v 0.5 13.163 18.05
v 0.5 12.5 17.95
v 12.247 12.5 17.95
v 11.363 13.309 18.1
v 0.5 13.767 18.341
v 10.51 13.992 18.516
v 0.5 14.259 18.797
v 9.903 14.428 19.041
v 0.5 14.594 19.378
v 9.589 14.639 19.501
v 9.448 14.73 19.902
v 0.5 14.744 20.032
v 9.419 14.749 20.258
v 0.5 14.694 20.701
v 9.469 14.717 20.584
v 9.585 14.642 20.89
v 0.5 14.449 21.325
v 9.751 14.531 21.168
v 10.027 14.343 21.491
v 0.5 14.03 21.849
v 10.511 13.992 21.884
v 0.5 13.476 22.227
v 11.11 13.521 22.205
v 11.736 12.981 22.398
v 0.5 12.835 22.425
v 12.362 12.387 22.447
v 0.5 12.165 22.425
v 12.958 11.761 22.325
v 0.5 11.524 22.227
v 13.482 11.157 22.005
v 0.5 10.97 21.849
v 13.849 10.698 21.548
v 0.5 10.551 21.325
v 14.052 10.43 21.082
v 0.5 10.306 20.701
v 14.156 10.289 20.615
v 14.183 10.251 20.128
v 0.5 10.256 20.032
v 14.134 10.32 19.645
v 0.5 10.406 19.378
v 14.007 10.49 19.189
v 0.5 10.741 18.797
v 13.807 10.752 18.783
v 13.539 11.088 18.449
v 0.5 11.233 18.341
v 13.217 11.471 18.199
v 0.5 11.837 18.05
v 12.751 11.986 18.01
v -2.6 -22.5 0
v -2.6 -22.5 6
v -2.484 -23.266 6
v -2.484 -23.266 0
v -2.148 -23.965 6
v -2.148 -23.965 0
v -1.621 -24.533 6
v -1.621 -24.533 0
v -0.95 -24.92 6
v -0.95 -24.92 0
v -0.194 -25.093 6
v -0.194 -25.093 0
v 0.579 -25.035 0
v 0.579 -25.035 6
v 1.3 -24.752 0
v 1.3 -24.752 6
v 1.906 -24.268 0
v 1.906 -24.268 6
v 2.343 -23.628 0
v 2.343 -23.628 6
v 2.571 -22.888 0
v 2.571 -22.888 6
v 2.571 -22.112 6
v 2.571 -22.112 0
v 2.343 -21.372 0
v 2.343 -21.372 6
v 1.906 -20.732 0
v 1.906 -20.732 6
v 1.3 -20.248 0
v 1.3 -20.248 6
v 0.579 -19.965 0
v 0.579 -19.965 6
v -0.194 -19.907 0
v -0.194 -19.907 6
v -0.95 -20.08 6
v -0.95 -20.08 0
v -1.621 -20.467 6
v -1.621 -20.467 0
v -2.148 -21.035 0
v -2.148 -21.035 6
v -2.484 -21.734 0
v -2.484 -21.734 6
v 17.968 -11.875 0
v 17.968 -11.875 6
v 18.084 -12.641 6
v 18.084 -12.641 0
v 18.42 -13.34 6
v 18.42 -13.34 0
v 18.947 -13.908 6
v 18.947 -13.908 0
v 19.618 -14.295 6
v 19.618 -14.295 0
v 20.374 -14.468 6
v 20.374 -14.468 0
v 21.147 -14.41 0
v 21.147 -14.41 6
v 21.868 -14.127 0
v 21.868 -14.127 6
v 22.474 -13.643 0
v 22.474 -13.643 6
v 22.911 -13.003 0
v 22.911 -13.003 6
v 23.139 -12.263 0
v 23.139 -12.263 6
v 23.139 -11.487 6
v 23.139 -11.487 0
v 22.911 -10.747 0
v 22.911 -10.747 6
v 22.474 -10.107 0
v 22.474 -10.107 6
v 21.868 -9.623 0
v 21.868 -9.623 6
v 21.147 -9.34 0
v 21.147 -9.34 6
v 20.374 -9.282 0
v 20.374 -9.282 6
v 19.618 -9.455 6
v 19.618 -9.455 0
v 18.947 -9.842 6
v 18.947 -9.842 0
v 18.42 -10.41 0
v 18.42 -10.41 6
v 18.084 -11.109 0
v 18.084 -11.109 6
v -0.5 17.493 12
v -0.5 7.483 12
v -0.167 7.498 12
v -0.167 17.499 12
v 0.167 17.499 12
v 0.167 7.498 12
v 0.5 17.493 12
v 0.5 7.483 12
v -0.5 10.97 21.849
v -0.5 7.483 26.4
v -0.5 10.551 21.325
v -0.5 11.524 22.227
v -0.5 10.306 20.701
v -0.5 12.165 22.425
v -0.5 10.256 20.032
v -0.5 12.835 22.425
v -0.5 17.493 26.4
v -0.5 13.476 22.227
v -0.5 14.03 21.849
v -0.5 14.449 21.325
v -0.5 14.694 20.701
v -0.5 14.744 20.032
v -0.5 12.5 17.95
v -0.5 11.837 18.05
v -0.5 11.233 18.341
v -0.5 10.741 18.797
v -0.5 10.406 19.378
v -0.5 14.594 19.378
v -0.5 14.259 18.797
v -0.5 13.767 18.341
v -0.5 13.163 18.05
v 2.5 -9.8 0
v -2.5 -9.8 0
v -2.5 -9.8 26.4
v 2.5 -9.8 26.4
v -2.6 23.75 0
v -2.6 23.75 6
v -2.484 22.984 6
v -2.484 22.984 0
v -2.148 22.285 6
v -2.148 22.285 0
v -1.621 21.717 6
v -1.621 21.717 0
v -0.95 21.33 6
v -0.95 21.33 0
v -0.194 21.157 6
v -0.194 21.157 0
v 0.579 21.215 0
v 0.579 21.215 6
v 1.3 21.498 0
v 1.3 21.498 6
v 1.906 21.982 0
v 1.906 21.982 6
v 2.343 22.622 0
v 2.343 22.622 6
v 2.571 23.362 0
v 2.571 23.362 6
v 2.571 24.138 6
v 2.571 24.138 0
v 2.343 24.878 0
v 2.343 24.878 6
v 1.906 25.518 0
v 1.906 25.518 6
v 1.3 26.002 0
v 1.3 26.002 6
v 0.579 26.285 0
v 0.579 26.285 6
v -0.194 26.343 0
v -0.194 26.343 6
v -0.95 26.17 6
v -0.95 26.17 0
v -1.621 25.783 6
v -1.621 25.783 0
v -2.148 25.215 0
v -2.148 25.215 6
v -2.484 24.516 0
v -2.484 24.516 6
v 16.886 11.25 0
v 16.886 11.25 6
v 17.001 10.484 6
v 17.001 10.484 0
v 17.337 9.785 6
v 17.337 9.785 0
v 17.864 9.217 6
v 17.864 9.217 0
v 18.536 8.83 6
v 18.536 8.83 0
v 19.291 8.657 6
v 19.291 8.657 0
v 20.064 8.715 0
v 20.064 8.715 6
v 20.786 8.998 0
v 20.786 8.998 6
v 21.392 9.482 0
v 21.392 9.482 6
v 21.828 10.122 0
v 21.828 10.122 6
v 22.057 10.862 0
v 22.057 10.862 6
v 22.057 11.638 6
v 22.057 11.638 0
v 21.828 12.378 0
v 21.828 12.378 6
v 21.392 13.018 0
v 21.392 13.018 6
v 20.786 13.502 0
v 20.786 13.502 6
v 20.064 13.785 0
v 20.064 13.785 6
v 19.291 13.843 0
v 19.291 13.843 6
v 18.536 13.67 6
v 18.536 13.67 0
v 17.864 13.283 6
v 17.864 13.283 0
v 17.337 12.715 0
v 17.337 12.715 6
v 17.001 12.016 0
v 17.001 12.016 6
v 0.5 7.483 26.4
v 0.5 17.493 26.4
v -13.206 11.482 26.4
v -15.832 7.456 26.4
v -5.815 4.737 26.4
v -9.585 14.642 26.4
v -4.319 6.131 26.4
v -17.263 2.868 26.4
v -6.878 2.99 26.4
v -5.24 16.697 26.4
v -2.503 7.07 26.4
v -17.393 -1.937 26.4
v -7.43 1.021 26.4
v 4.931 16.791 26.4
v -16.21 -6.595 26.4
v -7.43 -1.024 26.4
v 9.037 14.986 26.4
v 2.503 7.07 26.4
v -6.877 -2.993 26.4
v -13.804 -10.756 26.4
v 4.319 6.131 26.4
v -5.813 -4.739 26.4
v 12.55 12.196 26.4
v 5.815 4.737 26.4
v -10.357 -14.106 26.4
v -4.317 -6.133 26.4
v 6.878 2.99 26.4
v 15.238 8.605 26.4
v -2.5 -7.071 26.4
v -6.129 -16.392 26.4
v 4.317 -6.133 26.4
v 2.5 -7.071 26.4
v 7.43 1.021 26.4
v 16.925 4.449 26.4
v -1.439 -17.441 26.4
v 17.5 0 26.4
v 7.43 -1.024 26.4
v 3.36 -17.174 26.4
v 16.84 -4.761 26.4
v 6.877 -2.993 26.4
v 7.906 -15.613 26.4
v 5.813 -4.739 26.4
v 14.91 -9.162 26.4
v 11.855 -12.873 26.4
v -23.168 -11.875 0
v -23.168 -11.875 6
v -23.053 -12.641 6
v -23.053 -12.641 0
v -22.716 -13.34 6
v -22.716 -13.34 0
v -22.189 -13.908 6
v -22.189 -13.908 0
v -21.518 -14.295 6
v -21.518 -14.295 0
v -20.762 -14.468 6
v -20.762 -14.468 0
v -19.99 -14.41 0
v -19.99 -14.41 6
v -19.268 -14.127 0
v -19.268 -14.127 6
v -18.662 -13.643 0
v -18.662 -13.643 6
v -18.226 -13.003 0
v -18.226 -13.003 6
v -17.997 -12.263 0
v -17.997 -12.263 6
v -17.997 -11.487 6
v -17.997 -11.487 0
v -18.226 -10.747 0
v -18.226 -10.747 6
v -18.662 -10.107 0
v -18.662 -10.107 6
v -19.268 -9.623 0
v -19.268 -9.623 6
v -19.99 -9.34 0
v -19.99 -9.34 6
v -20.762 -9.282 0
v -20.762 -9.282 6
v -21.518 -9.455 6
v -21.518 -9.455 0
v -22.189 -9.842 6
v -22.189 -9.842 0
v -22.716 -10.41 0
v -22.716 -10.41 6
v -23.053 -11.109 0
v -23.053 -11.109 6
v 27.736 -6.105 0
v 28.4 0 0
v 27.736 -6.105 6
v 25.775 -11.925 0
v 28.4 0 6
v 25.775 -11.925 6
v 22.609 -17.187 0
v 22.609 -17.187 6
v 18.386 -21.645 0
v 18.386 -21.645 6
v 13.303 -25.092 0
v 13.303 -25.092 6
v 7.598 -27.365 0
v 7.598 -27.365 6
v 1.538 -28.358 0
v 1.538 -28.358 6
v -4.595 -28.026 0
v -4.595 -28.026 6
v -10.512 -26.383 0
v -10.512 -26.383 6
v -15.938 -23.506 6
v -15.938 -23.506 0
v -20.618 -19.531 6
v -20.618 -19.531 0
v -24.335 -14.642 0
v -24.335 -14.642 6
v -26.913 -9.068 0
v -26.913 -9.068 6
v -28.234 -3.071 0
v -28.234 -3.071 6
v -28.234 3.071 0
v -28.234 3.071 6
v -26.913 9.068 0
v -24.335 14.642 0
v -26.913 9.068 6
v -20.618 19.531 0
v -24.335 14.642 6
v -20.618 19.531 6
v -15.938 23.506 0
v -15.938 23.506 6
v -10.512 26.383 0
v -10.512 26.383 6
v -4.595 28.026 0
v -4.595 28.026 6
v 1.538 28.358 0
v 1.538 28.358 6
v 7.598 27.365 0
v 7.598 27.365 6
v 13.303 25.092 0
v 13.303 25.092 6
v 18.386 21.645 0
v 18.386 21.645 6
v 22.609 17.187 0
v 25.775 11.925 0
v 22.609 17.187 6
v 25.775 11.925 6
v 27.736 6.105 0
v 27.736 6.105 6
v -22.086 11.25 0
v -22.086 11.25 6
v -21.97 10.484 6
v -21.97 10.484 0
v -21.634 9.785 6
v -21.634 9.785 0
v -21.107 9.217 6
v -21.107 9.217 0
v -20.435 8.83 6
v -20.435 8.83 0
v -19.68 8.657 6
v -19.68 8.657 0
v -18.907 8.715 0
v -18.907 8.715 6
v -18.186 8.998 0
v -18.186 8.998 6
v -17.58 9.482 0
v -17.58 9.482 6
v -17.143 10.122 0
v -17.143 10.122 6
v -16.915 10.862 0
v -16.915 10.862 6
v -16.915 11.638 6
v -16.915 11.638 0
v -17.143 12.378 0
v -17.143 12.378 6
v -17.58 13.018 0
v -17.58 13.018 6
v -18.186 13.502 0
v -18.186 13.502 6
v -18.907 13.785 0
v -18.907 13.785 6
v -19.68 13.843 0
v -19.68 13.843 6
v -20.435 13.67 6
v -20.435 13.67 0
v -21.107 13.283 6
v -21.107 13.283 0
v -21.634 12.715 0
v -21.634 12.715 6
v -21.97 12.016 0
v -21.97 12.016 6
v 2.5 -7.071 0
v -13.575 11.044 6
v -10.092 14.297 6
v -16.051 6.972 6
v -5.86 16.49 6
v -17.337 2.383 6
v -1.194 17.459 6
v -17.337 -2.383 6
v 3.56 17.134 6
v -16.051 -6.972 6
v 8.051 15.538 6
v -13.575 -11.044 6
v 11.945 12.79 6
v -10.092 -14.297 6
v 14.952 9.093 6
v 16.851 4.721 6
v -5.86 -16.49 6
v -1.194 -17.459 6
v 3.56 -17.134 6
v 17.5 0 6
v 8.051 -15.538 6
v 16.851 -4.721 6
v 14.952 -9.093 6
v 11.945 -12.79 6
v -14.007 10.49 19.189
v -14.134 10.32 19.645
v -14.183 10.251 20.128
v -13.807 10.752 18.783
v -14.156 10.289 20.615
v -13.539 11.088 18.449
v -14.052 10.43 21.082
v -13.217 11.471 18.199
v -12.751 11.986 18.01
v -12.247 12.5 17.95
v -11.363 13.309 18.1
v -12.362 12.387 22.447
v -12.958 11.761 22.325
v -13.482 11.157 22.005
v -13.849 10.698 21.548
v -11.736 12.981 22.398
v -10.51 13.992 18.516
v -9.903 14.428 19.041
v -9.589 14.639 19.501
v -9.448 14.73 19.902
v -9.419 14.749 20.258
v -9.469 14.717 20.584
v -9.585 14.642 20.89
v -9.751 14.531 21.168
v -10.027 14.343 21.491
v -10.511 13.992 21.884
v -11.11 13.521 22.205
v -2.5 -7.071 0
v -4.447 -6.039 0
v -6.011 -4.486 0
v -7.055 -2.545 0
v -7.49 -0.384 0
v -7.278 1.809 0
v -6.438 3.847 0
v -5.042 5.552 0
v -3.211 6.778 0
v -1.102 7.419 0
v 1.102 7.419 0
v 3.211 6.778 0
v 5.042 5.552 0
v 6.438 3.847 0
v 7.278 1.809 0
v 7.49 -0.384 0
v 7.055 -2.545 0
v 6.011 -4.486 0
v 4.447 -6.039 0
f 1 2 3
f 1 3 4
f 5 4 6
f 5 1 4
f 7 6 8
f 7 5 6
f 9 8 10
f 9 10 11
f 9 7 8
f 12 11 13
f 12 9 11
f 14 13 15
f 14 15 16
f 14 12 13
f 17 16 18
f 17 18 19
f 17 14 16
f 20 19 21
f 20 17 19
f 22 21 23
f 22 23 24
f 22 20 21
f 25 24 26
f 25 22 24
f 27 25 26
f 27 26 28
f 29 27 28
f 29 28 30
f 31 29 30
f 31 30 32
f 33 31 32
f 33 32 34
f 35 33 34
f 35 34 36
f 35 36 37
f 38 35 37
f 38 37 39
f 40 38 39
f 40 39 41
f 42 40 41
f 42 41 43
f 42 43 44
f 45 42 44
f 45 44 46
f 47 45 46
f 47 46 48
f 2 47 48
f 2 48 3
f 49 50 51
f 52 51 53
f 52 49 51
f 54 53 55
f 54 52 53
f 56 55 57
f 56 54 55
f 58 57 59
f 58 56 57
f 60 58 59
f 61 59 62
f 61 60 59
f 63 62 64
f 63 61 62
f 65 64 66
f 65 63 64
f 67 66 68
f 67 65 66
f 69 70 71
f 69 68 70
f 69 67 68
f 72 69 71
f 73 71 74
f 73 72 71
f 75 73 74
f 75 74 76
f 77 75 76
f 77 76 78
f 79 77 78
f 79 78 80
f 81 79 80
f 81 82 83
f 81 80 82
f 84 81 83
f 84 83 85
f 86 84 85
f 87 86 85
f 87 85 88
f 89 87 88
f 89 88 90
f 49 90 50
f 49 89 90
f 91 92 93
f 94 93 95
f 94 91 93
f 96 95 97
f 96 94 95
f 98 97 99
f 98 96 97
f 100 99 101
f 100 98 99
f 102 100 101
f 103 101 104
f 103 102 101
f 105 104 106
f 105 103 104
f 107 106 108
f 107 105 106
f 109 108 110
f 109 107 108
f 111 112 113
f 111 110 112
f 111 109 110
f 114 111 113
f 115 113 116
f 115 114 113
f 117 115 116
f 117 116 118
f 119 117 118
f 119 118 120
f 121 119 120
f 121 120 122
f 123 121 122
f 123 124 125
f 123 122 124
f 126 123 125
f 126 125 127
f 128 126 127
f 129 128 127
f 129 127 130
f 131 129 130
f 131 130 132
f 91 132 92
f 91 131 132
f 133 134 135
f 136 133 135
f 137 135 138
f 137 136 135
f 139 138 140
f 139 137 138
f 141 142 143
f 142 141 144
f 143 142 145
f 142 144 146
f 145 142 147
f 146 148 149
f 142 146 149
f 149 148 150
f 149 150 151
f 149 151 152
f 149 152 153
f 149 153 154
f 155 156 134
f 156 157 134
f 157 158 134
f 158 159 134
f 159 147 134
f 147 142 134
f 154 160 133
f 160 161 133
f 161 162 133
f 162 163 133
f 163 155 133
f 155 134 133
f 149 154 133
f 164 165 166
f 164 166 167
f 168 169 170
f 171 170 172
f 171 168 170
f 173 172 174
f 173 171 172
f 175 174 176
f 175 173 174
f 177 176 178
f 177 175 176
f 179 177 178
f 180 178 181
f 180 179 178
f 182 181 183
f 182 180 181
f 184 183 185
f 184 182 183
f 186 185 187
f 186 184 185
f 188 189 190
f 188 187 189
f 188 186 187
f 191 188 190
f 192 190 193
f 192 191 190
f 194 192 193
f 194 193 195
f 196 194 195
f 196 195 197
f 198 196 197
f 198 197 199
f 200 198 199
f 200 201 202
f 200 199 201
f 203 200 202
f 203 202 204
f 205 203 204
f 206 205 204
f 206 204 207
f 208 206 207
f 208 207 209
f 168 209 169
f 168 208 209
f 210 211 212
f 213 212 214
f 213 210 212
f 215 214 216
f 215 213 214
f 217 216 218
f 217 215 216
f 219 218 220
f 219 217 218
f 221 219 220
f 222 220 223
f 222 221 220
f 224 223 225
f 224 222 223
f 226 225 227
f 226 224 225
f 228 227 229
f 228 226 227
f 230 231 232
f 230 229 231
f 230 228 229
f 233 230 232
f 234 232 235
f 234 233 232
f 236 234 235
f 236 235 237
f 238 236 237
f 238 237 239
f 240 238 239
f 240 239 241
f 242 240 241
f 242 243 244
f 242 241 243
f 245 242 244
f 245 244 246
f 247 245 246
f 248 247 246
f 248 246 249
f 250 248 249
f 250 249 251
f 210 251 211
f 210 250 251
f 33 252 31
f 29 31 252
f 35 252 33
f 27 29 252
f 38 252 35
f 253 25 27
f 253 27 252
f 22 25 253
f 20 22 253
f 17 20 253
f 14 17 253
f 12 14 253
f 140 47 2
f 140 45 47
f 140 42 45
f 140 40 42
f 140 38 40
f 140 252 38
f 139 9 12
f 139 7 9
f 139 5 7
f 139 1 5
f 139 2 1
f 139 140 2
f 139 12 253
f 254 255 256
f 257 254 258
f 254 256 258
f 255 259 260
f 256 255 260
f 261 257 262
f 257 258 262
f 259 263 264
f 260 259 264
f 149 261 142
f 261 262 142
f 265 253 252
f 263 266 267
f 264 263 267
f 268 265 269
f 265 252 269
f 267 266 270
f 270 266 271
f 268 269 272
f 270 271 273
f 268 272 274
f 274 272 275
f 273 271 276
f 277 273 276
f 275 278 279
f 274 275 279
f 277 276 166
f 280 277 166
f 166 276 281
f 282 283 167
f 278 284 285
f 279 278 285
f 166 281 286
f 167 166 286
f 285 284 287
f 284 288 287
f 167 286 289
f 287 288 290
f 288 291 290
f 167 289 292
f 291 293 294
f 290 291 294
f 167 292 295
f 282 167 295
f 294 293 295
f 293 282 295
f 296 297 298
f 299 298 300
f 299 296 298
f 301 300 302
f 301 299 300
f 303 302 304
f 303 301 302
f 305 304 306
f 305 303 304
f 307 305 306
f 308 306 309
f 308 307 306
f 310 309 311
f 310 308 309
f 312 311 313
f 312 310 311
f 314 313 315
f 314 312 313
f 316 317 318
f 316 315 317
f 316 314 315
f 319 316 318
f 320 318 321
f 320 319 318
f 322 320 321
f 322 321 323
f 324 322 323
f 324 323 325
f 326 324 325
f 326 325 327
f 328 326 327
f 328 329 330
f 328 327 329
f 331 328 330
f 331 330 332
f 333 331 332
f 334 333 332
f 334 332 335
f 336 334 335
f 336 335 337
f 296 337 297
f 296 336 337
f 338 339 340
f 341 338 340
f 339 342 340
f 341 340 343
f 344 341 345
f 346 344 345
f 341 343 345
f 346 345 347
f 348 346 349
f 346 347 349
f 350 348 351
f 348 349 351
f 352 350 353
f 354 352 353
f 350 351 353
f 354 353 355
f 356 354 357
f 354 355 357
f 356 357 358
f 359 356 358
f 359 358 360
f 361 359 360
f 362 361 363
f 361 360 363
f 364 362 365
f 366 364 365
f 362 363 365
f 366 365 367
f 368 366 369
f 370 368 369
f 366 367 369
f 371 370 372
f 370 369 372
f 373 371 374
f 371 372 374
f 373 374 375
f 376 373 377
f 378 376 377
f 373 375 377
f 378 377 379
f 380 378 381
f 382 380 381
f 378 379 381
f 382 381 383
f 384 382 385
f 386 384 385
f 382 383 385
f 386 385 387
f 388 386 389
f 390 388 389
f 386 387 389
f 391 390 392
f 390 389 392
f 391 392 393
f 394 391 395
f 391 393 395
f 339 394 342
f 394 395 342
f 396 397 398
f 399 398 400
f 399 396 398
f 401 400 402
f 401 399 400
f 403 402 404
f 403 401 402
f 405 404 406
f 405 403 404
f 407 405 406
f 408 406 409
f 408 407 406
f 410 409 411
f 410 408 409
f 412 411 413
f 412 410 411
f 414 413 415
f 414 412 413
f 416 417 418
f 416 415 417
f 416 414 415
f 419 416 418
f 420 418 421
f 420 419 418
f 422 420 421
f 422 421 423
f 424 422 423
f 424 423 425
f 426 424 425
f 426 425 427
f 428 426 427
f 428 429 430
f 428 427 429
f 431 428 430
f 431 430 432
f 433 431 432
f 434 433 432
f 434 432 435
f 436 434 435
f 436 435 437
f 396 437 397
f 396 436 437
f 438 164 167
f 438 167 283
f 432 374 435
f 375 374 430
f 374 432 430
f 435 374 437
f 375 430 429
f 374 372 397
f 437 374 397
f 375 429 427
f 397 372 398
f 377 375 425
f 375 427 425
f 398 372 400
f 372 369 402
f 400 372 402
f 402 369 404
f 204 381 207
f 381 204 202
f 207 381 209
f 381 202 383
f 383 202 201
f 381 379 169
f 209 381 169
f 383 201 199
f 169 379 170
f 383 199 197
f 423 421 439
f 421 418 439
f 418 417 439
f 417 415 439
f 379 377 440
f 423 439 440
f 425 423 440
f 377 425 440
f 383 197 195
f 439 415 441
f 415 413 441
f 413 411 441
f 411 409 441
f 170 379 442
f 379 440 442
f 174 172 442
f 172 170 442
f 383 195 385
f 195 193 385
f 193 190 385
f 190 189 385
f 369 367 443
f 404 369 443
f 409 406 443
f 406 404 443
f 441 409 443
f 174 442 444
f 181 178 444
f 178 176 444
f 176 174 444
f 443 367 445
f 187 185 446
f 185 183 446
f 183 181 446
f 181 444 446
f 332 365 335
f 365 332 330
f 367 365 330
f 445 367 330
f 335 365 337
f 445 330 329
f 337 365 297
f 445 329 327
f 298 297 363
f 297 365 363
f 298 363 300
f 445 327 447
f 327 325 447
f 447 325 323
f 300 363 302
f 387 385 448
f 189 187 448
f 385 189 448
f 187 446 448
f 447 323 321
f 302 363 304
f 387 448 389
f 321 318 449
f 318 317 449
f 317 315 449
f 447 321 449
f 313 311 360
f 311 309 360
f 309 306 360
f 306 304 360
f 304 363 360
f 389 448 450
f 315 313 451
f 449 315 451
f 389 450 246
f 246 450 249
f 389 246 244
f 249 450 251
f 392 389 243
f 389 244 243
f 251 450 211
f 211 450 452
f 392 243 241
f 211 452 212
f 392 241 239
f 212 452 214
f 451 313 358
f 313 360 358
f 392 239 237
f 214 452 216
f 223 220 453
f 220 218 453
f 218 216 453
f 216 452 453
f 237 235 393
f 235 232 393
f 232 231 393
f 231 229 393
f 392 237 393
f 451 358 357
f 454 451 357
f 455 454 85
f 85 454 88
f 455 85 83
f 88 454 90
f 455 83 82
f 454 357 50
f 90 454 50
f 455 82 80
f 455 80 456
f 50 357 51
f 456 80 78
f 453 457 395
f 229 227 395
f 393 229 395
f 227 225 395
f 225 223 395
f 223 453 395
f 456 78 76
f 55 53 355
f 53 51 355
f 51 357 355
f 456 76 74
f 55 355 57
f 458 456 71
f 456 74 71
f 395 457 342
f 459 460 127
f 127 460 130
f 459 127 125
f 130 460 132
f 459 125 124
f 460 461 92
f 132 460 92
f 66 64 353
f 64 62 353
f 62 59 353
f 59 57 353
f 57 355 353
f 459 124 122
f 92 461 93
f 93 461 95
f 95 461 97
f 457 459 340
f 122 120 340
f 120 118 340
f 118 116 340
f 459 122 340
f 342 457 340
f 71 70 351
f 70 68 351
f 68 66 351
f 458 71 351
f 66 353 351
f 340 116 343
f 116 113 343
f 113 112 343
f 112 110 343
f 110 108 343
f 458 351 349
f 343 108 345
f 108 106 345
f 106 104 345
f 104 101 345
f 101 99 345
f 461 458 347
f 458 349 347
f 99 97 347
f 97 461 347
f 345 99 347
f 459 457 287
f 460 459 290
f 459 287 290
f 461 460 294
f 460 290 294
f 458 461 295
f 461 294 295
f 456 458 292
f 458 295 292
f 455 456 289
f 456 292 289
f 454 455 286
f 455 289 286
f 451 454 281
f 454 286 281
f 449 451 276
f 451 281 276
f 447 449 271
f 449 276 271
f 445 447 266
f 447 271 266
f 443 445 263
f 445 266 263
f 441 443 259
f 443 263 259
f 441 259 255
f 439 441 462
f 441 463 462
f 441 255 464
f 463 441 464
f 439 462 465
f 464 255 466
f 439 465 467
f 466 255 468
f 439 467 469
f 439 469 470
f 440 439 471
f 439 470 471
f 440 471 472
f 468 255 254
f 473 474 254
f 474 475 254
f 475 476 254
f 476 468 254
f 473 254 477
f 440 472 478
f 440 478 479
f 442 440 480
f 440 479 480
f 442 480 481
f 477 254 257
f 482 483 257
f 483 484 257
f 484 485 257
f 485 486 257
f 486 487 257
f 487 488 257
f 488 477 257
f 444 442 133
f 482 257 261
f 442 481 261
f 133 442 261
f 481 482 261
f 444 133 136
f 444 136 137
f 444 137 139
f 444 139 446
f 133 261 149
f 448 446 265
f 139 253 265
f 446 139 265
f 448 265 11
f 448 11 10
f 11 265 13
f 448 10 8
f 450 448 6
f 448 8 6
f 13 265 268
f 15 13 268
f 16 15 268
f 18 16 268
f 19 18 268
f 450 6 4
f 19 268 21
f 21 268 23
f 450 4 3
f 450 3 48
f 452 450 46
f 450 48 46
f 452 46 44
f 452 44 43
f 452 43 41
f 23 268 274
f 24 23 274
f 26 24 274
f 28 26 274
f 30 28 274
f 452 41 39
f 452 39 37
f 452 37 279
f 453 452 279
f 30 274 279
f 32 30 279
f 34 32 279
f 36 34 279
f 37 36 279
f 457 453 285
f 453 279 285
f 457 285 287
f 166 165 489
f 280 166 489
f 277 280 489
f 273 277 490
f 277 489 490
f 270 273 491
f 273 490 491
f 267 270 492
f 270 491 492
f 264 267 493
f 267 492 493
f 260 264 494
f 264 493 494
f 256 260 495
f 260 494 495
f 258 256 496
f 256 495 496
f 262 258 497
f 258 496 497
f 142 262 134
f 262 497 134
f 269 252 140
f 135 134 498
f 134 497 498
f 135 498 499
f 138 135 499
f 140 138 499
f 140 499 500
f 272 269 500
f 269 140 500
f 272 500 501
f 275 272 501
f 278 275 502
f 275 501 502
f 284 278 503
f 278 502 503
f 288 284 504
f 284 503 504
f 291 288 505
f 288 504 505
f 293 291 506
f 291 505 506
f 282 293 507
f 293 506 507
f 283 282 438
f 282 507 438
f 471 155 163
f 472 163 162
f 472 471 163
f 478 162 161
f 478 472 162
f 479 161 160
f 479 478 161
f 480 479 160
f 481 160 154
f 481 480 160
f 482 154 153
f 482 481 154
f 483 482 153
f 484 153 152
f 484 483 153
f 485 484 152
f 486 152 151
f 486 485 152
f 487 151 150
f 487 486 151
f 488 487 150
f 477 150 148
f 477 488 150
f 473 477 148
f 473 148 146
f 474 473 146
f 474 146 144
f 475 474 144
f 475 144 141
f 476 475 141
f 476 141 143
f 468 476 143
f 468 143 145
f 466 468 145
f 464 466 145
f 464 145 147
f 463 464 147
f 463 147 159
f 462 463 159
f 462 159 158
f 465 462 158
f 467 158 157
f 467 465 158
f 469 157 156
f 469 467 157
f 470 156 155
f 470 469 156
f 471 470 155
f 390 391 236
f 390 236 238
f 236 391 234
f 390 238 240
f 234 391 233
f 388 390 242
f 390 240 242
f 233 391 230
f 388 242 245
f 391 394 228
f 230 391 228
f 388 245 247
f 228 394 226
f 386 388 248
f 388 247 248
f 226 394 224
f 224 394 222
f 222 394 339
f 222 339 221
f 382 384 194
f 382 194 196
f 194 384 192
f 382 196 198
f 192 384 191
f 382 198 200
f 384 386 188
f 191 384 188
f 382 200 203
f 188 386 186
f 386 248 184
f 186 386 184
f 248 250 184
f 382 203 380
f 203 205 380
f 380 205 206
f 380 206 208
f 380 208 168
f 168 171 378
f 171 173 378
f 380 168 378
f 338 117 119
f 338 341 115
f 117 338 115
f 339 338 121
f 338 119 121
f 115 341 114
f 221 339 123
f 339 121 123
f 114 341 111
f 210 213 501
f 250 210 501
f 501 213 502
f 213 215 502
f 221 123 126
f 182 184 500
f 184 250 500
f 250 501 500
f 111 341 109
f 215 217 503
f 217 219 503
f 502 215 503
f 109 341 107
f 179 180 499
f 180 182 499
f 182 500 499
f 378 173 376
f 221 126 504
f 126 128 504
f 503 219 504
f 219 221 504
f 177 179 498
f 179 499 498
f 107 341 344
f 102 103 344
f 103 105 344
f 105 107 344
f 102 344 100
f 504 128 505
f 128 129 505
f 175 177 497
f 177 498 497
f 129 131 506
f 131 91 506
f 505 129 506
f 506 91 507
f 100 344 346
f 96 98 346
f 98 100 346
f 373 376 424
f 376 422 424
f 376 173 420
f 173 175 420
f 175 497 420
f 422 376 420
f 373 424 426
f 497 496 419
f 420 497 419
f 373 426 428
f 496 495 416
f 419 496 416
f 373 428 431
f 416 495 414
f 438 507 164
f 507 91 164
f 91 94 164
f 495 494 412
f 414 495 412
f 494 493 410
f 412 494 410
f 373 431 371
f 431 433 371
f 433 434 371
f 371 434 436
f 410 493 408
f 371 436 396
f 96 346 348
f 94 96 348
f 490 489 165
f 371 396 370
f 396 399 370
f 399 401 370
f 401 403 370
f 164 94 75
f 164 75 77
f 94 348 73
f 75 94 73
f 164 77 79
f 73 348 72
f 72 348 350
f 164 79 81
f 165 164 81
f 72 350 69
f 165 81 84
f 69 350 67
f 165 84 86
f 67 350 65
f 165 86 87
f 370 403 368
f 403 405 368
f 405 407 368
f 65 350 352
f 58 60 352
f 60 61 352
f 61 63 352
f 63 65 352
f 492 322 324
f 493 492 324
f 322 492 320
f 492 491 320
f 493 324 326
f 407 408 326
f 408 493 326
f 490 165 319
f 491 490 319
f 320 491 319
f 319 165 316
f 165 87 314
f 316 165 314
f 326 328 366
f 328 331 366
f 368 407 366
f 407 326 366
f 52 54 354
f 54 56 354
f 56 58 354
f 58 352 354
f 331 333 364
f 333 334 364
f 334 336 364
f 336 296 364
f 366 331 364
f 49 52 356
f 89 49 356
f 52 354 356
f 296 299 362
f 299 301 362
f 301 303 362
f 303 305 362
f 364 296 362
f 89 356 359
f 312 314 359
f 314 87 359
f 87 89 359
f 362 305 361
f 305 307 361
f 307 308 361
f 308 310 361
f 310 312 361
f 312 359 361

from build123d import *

# Parameters (mm, degrees)
SKETCH_2_R               = 2.6
CUT_EXTRUDE_1_DEPTH      = 49.063291606
SKETCH_3_W               = 5
SKETCH_3_H               = 3.3
CUT_EXTRUDE_2_DEPTH      = 49.063291606
CUT_EXTRUDE_START        = 12
SKETCH_4_W               = 1
SKETCH_4_H               = 11
CUT_EXTRUDE_3_DEPTH      = 14.4
CUT_EXTRUDE_4_DEPTH      = 49.063291606
CUT_EXTRUDE_4_DEPTH_BACK = 49.063291606
SKETCH_5_R               = 2.25


with BuildPart() as part:
    # 草图1 → 旋转1 (revolve)
    with BuildSketch(Plane(origin=(0, 0, 0), x_dir=(0, 0, -1), z_dir=(1, 0, 0)), mode=Mode.PRIVATE) as revolve_1_sk:
        Polygon((0, 7.5), (0, 28.4), (-6, 28.4), (-6, 17.5), (-26.4, 17.5), (-26.4, 7.5), align=None)
    revolve(revolve_1_sk.sketch.rotate(Axis((0, 0, 31.4), (0, 0, -1)), 90), axis=Axis((0, 0, 31.4), (0, 0, -1)))

    # 草图2 → 切除-拉伸1 (cut, through all)
    with BuildSketch(Plane.XY):
        with Locations(Location((0, 23.75, 0), (0, 0, 180))):
            Circle(SKETCH_2_R)
        with Locations(Location((-20.56810334, -11.875, 0), (0, 0, 180))):
            Circle(SKETCH_2_R)
        with Locations(Location((20.56810334, -11.875, 0), (0, 0, 180))):
            Circle(SKETCH_2_R)
        with Locations(Location((19.485571585, 11.25, 0), (0, 0, 180))):
            Circle(SKETCH_2_R)
        with Locations(Location((-19.485571585, 11.25, 0), (0, 0, 180))):
            Circle(SKETCH_2_R)
        with Locations(Location((0, -22.5, 0), (0, 0, 180))):
            Circle(SKETCH_2_R)
    extrude(amount=CUT_EXTRUDE_1_DEPTH, mode=Mode.SUBTRACT)

    # 草图3 → 切除-拉伸2 (cut, through all)
    with BuildSketch(Plane.XY):
        with Locations((0, -8.15)):
            Rectangle(SKETCH_3_W, SKETCH_3_H)
    extrude(amount=CUT_EXTRUDE_2_DEPTH, mode=Mode.SUBTRACT)

    # 草图4 → 切除-拉伸3 (cut)
    with BuildSketch(Plane.XY.offset(CUT_EXTRUDE_START)):
        with Locations((0, 12.5)):
            Rectangle(SKETCH_4_W, SKETCH_4_H)
    extrude(amount=CUT_EXTRUDE_3_DEPTH, mode=Mode.SUBTRACT)

    # 草图5 → 切除-拉伸4 (cut, two sides: drawn at the far end of the back side and taken through both)
    with BuildSketch(Plane(origin=(0, 0, 0), x_dir=(0, 0, -1), z_dir=(1, 0, 0)).offset(-CUT_EXTRUDE_4_DEPTH_BACK)):
        with Locations((-20.2, 12.5)):
            Circle(SKETCH_5_R)
    extrude(amount=CUT_EXTRUDE_4_DEPTH + CUT_EXTRUDE_4_DEPTH_BACK, mode=Mode.SUBTRACT)


solid = part.part
